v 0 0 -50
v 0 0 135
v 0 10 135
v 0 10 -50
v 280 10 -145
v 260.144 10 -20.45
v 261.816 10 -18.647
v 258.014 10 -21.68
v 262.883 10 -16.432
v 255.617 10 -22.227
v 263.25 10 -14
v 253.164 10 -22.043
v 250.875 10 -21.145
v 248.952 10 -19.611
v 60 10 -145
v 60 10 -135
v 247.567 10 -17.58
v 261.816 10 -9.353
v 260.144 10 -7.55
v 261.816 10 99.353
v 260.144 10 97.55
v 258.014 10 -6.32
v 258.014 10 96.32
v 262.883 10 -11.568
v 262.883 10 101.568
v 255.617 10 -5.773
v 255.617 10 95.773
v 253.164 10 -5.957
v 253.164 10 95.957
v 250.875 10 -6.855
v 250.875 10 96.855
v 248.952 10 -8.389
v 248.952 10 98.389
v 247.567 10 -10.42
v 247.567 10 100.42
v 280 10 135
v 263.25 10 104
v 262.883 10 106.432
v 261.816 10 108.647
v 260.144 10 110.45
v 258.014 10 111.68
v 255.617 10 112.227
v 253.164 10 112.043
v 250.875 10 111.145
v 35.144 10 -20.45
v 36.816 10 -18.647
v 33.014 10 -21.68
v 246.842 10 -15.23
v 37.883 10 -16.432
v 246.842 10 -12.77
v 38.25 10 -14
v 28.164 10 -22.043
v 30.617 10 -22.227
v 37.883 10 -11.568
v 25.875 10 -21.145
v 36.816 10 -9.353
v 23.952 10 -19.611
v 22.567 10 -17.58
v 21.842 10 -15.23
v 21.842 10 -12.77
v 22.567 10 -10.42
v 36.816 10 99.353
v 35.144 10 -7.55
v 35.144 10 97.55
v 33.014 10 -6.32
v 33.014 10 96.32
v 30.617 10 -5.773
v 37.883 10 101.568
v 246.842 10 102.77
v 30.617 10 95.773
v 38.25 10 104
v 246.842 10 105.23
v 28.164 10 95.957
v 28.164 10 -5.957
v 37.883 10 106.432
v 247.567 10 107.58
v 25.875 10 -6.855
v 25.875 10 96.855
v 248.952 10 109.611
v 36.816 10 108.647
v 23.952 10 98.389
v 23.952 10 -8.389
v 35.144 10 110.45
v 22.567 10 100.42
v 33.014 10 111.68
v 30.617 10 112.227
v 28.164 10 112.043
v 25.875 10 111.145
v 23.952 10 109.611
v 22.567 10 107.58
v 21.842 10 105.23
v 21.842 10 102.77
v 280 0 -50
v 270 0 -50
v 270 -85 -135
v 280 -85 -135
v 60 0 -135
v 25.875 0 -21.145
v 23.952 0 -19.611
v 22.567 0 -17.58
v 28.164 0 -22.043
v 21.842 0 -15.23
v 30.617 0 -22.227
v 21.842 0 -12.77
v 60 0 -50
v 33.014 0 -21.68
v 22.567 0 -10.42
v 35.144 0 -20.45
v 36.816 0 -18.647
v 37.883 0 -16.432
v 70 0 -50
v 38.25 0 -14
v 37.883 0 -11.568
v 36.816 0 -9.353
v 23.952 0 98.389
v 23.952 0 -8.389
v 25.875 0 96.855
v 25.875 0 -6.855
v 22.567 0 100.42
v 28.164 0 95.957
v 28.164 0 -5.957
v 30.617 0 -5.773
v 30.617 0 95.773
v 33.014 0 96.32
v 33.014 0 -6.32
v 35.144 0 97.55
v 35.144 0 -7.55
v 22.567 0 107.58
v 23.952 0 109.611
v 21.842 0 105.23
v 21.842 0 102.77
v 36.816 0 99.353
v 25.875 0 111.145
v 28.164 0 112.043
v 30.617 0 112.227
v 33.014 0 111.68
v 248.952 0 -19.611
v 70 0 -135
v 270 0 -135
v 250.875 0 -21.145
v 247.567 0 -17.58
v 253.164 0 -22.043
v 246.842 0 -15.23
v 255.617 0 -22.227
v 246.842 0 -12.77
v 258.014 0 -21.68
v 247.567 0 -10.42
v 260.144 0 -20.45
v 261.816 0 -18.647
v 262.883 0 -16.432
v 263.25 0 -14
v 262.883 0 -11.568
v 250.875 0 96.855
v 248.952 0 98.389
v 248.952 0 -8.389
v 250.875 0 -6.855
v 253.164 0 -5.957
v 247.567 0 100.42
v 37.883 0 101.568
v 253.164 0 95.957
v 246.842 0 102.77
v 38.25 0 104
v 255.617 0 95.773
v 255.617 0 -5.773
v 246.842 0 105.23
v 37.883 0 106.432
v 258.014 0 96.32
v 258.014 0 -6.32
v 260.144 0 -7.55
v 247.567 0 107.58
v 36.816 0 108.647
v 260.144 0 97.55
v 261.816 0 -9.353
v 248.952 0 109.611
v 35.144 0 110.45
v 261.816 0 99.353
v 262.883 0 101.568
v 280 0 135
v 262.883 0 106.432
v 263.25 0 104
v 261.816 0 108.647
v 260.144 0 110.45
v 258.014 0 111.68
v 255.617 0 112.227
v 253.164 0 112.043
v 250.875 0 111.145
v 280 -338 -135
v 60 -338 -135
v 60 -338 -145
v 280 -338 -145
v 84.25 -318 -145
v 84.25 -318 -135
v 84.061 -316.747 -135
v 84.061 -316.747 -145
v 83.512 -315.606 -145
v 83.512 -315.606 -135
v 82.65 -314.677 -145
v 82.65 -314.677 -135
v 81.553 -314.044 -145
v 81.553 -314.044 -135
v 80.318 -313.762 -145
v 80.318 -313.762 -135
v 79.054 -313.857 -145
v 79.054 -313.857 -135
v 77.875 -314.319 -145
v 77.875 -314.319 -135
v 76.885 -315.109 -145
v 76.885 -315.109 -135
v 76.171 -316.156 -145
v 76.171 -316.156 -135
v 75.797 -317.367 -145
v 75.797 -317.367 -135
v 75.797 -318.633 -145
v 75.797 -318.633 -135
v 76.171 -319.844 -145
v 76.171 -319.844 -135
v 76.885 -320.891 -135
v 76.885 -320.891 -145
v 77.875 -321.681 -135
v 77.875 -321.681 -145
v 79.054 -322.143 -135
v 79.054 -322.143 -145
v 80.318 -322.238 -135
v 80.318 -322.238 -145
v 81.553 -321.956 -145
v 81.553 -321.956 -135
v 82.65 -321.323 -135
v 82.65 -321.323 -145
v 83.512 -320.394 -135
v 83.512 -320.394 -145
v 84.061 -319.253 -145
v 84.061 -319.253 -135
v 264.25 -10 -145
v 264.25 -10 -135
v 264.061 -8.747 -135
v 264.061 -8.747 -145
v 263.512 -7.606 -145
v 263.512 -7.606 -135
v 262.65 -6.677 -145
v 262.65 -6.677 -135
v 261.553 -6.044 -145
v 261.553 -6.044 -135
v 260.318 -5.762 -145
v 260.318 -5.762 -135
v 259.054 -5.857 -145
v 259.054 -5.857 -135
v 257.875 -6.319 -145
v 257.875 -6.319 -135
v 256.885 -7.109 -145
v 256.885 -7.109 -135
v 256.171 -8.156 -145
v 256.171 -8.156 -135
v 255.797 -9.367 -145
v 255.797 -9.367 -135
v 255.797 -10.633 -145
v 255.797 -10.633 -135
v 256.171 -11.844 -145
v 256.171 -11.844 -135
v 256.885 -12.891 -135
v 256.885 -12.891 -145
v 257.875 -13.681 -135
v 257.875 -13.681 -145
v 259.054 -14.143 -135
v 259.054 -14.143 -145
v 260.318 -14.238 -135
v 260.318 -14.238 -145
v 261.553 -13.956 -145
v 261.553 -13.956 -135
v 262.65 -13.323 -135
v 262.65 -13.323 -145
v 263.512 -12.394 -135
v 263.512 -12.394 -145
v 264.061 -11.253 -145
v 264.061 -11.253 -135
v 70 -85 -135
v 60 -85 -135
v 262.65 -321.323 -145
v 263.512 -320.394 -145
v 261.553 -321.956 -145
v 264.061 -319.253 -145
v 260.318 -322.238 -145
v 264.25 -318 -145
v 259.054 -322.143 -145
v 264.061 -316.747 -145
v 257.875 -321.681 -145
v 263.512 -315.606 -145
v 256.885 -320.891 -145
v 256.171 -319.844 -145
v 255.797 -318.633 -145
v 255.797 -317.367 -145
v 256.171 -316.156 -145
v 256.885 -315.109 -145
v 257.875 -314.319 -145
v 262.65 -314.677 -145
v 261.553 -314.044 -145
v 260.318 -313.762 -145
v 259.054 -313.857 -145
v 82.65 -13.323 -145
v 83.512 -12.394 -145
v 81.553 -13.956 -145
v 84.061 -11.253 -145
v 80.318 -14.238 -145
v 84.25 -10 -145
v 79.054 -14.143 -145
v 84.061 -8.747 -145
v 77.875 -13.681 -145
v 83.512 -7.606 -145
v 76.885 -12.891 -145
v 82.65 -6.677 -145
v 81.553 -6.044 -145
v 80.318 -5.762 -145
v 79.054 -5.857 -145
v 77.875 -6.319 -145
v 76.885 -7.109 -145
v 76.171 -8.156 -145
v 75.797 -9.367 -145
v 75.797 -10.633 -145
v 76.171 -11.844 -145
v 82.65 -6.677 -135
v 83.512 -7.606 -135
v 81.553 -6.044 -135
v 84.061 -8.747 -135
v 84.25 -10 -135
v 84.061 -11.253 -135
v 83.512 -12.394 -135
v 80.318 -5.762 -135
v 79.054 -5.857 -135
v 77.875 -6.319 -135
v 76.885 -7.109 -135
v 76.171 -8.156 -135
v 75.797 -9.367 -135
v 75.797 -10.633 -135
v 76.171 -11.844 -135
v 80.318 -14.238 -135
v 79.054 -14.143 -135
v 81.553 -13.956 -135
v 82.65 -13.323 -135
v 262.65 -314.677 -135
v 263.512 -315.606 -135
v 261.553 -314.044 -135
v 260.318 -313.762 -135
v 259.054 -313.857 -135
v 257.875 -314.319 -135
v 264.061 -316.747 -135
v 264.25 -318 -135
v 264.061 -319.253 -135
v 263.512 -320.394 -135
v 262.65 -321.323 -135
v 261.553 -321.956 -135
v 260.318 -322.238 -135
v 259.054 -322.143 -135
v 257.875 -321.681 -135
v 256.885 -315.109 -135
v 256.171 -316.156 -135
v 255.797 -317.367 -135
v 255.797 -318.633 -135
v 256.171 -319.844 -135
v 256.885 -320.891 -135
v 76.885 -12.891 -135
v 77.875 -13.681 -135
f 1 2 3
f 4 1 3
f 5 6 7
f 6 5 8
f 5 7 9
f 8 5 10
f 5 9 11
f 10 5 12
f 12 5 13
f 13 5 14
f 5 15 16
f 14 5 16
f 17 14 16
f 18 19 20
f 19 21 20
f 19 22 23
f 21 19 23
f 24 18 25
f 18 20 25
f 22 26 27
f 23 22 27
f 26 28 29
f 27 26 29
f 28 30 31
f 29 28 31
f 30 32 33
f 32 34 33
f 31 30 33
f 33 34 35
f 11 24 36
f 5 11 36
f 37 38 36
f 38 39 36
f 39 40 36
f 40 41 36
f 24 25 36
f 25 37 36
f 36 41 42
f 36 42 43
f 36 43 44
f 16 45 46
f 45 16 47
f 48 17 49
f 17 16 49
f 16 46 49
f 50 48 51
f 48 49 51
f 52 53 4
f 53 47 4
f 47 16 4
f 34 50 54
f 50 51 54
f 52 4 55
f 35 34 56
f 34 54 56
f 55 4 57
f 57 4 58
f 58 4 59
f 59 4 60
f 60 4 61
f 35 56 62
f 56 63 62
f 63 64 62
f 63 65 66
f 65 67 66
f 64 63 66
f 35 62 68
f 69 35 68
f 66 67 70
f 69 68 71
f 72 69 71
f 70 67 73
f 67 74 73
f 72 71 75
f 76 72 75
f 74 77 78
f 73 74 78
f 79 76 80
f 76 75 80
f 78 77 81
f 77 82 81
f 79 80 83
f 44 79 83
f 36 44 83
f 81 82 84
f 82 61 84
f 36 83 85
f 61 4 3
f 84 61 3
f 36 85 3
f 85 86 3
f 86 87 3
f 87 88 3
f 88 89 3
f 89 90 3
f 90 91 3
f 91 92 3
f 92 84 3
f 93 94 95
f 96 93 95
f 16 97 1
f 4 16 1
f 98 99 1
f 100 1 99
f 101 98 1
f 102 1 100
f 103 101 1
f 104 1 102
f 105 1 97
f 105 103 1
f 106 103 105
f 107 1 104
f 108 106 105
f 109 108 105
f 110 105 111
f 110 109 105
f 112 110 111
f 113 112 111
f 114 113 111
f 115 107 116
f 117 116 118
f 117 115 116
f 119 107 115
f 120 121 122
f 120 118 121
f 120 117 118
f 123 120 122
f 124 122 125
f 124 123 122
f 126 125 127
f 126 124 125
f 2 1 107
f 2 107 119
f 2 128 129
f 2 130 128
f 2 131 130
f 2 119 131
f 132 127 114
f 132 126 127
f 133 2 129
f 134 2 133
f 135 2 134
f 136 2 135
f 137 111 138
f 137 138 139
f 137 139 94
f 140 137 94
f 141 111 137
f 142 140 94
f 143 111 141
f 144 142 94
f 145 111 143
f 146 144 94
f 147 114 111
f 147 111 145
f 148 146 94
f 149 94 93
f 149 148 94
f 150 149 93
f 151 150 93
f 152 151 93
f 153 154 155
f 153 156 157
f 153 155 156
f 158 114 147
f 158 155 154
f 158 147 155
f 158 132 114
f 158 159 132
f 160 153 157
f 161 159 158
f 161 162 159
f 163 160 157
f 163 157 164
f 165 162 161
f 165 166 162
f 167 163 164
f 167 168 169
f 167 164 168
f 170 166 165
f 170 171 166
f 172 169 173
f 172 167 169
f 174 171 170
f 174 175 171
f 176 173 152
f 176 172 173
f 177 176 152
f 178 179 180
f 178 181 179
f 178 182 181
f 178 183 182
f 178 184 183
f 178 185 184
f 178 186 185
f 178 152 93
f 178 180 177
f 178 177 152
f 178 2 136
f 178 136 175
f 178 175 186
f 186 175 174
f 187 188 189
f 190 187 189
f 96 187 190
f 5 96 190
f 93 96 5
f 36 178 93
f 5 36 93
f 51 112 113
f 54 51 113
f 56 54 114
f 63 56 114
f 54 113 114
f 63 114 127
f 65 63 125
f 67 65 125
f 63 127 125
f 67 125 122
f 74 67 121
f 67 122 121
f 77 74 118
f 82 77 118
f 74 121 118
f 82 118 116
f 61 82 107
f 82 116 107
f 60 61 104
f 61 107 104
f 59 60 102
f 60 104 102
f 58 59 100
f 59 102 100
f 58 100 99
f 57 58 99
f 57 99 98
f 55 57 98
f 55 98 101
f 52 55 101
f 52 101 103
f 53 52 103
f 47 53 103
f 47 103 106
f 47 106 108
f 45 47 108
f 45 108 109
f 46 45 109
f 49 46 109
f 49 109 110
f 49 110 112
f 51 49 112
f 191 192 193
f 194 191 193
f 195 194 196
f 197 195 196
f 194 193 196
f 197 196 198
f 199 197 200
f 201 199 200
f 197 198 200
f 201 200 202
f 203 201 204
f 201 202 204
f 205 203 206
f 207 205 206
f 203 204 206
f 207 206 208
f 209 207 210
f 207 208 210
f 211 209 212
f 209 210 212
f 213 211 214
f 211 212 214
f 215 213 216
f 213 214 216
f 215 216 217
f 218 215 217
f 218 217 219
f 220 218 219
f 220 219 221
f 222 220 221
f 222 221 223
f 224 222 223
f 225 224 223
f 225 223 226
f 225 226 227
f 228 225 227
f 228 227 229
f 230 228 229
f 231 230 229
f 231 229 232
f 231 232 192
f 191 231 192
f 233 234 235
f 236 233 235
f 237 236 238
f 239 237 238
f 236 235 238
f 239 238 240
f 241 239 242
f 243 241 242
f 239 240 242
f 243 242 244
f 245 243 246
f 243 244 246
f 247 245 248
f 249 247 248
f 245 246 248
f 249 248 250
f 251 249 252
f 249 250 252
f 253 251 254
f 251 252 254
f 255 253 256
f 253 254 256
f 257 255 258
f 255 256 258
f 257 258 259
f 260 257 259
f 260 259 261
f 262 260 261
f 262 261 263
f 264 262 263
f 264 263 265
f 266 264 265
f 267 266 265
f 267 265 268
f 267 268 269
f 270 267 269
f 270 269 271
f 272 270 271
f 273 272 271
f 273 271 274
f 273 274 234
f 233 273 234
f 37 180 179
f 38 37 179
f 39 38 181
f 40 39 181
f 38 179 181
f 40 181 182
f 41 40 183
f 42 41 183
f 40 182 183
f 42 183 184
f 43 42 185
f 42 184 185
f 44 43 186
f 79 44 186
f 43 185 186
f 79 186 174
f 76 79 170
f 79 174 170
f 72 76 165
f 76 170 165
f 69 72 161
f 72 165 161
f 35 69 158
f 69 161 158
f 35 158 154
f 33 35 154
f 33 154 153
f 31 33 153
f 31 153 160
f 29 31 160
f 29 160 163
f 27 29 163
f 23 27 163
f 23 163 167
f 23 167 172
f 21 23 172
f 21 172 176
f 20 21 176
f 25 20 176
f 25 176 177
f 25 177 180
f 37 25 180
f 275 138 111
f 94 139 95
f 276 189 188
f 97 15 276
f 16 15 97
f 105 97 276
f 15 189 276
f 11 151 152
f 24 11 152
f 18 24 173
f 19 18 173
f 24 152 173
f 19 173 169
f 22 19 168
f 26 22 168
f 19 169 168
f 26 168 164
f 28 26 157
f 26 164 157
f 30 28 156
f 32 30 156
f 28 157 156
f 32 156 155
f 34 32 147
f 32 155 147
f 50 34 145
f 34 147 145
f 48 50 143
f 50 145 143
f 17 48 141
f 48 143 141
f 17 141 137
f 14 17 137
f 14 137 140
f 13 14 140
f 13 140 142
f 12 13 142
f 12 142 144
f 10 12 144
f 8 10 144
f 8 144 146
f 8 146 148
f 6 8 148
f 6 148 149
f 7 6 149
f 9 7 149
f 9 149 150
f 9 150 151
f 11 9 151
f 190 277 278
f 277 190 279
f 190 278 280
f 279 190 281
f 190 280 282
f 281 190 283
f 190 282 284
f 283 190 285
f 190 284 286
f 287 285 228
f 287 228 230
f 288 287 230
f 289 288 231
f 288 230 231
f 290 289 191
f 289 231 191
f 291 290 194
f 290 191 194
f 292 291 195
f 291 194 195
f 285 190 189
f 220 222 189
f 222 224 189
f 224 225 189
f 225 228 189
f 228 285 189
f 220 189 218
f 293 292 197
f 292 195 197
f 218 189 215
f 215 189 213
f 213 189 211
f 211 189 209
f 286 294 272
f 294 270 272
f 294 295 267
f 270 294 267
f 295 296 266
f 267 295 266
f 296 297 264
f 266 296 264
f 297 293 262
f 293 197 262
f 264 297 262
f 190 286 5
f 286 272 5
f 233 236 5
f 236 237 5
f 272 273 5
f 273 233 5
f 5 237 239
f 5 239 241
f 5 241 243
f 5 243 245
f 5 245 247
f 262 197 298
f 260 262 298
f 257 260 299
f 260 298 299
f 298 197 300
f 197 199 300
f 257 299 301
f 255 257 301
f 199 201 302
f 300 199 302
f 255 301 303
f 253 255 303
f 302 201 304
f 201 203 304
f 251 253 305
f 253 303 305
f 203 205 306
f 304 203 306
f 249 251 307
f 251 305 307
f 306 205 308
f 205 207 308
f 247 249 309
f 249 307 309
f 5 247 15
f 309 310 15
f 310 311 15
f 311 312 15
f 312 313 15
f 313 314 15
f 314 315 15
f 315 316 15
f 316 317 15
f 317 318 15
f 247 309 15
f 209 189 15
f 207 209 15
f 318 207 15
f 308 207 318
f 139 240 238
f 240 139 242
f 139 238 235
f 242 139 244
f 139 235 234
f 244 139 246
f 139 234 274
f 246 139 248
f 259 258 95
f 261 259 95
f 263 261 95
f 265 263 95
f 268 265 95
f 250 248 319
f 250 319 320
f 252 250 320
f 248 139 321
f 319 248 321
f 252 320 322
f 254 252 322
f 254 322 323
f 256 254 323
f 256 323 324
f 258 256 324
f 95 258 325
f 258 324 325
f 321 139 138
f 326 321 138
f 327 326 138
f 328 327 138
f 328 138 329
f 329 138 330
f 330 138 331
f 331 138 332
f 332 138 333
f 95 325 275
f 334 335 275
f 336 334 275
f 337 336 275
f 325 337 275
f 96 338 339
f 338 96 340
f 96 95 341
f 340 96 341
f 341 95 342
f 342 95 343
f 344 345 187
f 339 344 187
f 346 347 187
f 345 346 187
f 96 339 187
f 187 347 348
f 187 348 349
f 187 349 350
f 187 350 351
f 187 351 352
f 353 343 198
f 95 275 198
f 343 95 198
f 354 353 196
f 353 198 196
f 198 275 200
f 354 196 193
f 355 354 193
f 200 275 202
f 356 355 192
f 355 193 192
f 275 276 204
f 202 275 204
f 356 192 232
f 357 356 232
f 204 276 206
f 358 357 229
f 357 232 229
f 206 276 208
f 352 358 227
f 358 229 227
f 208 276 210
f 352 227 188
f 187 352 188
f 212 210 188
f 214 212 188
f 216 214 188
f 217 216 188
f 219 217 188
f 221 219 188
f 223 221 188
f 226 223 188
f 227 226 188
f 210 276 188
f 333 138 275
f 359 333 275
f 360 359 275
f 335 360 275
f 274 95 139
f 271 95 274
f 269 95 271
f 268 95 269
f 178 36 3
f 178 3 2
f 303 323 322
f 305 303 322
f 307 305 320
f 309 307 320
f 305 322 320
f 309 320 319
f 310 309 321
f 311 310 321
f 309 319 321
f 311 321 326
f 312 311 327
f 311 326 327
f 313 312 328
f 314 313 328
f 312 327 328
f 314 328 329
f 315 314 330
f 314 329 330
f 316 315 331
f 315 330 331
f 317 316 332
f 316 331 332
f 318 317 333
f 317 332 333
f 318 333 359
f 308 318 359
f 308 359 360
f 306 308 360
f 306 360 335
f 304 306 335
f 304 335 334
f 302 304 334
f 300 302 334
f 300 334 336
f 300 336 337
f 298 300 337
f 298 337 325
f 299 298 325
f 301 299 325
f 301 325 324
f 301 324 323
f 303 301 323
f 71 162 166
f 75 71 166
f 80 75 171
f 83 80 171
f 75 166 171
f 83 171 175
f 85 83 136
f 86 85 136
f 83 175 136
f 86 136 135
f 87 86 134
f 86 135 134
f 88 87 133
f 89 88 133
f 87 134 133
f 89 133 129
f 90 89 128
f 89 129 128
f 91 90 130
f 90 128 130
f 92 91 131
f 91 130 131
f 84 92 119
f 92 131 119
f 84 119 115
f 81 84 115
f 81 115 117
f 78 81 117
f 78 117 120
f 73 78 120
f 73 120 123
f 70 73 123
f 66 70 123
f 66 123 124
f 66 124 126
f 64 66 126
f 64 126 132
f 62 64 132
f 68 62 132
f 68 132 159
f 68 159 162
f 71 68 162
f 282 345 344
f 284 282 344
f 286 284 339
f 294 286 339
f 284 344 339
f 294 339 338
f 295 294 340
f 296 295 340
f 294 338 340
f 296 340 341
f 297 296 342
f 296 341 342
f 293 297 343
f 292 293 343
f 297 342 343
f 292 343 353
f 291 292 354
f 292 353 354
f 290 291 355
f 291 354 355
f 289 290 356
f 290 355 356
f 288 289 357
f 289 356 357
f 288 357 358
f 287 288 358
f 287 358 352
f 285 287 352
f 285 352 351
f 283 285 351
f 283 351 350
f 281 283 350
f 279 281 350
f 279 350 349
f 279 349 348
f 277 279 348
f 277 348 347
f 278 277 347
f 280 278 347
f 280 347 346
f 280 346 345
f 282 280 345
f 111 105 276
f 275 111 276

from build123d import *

# Parameters (mm, degrees)
F1_DEPTH  = 280
F2_W      = 60
F2_H      = 338
F3_DEPTH  = 10.001
F5_DEPTH  = 10.001
F6_R      = 8.25
F7_DEPTH  = 10.001
F8_R      = 4.25
F9_DEPTH  = 10.001
F10_W     = 10
F10_H     = 85
F11_DEPTH = 85
F14_DEPTH = 220.001
F15_DEPTH = 280.001


with BuildPart() as f1:
    # F0 (on Right) → F1 (new body)
    with BuildSketch(Plane.YZ):
        Polygon((10, -145), (10, 135), (0, 135), (0, -135), (-338, -135), (-338, -145), align=None)
    extrude(amount=F1_DEPTH)

    # F2 (on face) → F3 (cut, through all)
    with BuildSketch(Plane.XY.offset(-135)):
        with Locations((30, -169)):
            Rectangle(F2_W, F2_H)
    extrude(amount=-F3_DEPTH, mode=Mode.SUBTRACT)

    # F4 (on face) → F5 (cut, through all)
    with BuildSketch(Plane.XZ):
        Polygon((60, -135), (0, -50), (0, -145), (60, -145), align=None)
    extrude(amount=-F5_DEPTH, mode=Mode.SUBTRACT)

    # F6 (on face) → F7 (cut, through all)
    with BuildSketch(Plane.XZ):
        with Locations((30, 104)):
            Circle(F6_R)
        with Locations((255, 104)):
            Circle(F6_R)
        with Locations((255, -14)):
            Circle(F6_R)
        with Locations((30, -14)):
            Circle(F6_R)
    extrude(amount=-F7_DEPTH, mode=Mode.SUBTRACT)

    # F8 (on face) → F9 (cut, through all)
    with BuildSketch(Plane.XY.offset(-135)):
        with Locations((80, -10)):
            Circle(F8_R)
        with Locations((260, -10)):
            Circle(F8_R)
        with Locations((80, -318)):
            Circle(F8_R)
        with Locations((260, -318)):
            Circle(F8_R)
    extrude(amount=-F9_DEPTH, mode=Mode.SUBTRACT)

    # F10 (on face) → F11 (join)
    with BuildSketch(Plane.XZ):
        with Locations((65, -92.5)):
            Rectangle(F10_W, F10_H)
        with Locations((275, -92.5)):
            Rectangle(F10_W, F10_H)
    extrude(amount=F11_DEPTH)

    # F13 (on face) → F14 (cut, through all)
    with BuildSketch(Plane(origin=(60, 0, 0), x_dir=(0, -1, 0), z_dir=(-1, 0, 0))):
        Polygon((85, -50), (0, -50), (85, -135), align=None)
    extrude(amount=-F14_DEPTH, mode=Mode.SUBTRACT)

    # F12 (on face) → F15 (cut, through all)
    with BuildSketch(Plane.YZ.offset(280)):
        Polygon((-85, -135), (0, -50), (-85, -50), align=None)
    extrude(amount=-F15_DEPTH, mode=Mode.SUBTRACT)


solid = f1.part
